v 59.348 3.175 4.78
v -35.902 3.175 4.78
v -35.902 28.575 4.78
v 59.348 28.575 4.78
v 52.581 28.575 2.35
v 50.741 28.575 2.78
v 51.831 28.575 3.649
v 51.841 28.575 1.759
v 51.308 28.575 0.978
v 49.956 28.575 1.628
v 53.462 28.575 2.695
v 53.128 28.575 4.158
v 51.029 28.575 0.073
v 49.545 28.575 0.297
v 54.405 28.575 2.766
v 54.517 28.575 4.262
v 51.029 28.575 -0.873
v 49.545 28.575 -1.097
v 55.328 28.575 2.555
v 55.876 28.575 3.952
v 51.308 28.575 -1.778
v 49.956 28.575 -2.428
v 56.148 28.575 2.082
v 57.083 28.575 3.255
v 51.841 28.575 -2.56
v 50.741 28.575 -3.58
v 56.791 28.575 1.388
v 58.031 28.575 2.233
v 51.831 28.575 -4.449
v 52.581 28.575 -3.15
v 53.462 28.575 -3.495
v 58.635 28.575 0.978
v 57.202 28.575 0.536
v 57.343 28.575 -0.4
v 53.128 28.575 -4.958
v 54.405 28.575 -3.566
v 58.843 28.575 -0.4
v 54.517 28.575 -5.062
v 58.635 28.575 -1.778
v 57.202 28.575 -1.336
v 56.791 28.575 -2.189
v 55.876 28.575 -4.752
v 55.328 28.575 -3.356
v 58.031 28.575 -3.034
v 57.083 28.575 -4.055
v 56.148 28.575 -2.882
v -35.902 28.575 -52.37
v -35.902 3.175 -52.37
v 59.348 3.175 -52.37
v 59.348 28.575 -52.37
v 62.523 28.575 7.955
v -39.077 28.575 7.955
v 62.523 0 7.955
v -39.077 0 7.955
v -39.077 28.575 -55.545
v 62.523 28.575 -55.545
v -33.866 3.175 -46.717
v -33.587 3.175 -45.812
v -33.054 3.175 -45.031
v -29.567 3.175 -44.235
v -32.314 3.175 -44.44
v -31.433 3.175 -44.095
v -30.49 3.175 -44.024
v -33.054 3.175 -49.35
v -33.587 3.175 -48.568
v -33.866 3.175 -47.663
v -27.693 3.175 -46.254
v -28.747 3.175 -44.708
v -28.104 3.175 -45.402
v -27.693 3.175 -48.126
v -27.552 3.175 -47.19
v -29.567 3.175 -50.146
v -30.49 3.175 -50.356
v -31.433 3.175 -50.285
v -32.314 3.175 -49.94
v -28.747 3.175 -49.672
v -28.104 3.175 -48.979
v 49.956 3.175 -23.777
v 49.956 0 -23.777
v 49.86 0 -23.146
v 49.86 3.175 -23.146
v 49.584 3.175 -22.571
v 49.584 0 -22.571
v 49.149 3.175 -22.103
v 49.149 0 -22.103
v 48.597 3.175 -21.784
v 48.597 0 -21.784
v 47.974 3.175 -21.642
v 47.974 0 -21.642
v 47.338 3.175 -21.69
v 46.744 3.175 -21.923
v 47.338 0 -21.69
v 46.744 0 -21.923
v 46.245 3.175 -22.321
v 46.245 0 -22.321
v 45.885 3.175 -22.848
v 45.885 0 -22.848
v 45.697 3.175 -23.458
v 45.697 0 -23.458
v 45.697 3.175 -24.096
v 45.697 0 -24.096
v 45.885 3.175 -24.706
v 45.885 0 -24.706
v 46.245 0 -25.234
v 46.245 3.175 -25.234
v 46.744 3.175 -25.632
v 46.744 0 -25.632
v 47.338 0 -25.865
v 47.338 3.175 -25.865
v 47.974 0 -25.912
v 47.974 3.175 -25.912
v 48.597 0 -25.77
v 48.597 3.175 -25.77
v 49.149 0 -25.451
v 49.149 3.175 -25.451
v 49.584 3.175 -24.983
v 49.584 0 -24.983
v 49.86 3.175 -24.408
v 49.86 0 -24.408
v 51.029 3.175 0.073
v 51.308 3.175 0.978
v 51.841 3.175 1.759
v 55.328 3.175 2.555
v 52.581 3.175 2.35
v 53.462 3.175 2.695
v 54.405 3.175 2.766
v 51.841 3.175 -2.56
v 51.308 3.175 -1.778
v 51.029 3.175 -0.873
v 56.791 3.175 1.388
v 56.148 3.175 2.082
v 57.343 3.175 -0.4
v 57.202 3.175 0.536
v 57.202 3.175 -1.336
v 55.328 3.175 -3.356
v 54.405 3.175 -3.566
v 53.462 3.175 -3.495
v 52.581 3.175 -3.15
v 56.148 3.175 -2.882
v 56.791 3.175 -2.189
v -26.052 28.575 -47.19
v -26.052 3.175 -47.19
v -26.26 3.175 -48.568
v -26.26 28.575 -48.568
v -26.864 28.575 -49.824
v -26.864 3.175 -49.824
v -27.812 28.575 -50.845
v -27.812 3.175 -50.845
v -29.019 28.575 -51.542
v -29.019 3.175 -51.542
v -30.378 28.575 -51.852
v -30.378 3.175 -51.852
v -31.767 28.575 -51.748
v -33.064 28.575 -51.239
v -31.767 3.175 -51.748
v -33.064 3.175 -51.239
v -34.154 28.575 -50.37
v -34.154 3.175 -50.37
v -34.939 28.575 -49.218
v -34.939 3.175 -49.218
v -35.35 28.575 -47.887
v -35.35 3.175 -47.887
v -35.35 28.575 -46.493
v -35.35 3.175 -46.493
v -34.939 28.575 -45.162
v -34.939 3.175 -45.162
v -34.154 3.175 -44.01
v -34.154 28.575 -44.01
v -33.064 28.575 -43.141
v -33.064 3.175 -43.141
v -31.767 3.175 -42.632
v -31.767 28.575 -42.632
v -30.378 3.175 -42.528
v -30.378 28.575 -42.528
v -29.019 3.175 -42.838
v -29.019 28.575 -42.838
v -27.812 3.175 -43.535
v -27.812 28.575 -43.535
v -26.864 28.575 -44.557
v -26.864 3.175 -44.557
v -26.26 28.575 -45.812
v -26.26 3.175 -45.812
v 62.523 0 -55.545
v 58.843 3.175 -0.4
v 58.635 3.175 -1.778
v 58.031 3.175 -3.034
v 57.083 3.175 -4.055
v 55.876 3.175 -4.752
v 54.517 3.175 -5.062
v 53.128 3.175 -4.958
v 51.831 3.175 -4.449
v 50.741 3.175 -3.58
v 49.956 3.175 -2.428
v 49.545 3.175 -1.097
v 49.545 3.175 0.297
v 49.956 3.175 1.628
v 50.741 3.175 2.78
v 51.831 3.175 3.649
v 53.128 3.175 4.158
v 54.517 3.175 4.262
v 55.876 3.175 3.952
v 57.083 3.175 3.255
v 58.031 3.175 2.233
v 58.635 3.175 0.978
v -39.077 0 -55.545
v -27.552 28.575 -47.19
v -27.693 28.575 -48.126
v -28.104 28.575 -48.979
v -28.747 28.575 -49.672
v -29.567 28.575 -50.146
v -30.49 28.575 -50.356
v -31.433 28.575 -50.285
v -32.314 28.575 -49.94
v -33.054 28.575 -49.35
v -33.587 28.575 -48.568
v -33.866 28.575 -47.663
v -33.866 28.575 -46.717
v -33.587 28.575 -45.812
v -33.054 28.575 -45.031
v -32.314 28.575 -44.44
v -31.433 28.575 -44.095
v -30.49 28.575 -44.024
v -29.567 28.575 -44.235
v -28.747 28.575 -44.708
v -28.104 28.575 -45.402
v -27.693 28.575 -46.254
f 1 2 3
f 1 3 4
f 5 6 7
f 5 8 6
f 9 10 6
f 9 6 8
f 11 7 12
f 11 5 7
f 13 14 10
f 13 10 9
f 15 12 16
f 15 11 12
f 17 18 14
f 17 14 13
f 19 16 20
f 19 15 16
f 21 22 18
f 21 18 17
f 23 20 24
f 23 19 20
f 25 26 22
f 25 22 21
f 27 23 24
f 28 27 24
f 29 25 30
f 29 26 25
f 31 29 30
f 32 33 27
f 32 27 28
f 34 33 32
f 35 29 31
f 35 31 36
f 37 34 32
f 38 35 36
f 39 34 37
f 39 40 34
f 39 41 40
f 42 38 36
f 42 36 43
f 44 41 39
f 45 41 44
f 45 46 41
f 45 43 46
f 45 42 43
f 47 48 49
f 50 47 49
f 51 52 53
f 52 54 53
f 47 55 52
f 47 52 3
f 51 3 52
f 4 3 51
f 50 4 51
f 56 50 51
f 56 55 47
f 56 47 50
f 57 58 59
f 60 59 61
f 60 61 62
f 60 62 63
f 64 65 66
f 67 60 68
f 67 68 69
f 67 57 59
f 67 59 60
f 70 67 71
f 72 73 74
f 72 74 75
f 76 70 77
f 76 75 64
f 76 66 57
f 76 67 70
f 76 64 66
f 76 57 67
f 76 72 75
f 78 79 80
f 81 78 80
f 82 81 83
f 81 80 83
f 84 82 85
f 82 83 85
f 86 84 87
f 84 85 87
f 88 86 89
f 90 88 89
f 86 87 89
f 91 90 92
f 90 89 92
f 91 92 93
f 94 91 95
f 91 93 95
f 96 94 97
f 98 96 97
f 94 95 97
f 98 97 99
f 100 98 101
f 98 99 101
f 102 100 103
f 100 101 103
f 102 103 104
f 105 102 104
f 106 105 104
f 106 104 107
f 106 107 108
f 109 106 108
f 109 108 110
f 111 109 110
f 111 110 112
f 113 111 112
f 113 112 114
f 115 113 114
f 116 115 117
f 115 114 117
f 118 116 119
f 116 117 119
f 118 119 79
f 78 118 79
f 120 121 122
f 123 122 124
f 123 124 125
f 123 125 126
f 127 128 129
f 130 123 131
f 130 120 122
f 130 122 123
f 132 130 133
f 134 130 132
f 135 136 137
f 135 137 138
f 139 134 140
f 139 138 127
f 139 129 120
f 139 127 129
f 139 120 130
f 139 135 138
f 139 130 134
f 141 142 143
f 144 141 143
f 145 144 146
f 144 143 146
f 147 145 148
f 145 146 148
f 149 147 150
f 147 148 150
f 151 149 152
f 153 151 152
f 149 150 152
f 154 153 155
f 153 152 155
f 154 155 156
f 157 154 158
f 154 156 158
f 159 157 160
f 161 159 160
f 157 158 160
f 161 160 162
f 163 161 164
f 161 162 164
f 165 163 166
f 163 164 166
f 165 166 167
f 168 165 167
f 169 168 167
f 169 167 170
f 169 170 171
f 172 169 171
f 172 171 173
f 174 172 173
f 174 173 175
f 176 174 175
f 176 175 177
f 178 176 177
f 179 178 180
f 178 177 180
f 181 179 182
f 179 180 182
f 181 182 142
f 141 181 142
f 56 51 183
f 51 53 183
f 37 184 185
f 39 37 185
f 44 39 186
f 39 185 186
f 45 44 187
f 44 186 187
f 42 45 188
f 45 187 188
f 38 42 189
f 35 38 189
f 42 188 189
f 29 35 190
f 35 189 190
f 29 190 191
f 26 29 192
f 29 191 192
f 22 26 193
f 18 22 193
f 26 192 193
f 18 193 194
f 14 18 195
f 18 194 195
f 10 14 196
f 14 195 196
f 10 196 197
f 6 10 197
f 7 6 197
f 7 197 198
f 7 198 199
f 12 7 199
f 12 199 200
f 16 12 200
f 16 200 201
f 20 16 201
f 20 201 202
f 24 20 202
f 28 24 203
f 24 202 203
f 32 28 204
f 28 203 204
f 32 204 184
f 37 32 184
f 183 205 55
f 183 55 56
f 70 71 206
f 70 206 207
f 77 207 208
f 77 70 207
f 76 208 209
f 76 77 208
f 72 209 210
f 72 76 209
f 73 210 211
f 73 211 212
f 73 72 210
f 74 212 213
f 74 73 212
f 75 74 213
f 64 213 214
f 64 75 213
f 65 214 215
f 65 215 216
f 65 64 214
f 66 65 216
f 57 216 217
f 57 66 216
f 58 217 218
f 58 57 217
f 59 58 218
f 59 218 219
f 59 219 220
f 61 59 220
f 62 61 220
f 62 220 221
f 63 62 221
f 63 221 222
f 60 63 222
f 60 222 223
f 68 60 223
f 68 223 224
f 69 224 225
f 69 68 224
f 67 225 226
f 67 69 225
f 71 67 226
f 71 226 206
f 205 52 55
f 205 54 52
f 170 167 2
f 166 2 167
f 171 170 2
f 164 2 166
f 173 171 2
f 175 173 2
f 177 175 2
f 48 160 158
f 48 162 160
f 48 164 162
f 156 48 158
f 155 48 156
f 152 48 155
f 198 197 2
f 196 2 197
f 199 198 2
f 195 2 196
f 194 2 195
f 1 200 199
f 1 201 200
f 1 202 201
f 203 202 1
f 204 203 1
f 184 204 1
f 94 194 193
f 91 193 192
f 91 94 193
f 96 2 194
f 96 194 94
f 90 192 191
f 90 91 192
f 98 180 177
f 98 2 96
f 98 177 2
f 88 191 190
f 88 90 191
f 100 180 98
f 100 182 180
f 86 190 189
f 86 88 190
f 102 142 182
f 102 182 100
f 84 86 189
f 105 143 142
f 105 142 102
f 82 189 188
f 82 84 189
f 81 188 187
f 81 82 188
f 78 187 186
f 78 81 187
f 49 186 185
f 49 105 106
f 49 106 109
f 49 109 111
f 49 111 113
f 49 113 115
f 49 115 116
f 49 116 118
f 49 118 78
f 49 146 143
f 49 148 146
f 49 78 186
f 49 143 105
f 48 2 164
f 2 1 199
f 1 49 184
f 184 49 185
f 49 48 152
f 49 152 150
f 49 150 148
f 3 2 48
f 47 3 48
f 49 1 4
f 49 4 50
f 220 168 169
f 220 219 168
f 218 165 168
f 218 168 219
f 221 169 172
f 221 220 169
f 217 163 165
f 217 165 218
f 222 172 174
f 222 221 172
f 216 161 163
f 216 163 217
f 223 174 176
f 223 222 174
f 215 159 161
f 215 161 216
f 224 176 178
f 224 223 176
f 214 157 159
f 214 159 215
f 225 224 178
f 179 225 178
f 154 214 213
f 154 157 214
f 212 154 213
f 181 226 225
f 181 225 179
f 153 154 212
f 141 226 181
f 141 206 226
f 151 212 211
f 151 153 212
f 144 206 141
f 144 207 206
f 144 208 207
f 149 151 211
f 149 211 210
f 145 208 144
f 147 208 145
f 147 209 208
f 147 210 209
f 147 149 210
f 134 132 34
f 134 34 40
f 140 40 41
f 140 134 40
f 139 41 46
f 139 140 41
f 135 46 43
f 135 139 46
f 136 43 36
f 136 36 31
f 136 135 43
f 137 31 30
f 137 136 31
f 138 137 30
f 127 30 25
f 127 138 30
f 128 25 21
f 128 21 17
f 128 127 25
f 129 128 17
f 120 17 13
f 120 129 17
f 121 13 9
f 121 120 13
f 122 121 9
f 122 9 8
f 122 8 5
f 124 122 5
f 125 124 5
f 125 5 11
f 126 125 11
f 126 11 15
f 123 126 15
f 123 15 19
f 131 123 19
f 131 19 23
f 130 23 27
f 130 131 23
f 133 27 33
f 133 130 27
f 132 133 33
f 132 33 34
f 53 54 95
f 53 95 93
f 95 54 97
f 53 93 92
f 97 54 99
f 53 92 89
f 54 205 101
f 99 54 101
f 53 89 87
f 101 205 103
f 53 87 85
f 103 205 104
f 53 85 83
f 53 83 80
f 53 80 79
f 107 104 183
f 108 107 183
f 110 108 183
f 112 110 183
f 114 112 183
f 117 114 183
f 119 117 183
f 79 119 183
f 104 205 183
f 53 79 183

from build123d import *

# Parameters (mm, degrees)
SKETCH1_W           = 101.6
SKETCH1_H           = 63.5
BOSS_EXTRUDE1_DEPTH = 3.175
SKETCH2_W           = 101.6
SKETCH2_H           = 63.5
SKETCH2_W_2         = 95.25
SKETCH2_H_2         = 57.15
BOSS_EXTRUDE3_DEPTH = 25.4
SKETCH3_R           = 2.141141326
CUT_EXTRUDE1_DEPTH  = 3.175
SKETCH5_R           = 4.675
SKETCH5_R_2         = 3.175
BOSS_EXTRUDE4_DEPTH = 25.4


with BuildPart() as part:
    # Sketch1 → Boss-Extrude1 (new body)
    with BuildSketch(Plane(origin=(0, 0, 0), x_dir=(1, 0, 0), z_dir=(0, 1, 0))):
        with Locations((11.723076923, 23.795054945)):
            Rectangle(SKETCH1_W, SKETCH1_H)
    extrude(amount=BOSS_EXTRUDE1_DEPTH)

    # Sketch2 → Boss-Extrude3 (add)
    with BuildSketch(Plane(origin=(0, 3.175, 0), x_dir=(1, 0, 0), z_dir=(0, 1, 0))):
        with Locations((11.723076923, 23.795054945)):
            Rectangle(SKETCH2_W, SKETCH2_H)
        with Locations((11.723076923, 23.795054945)):
            Rectangle(SKETCH2_W_2, SKETCH2_H_2, mode=Mode.SUBTRACT)
    extrude(amount=BOSS_EXTRUDE3_DEPTH)

    # Sketch3 → Cut-Extrude1 (cut)
    with BuildSketch(Plane.XZ):
        with Locations((47.814406836, -23.777289581)):
            Circle(SKETCH3_R)
    extrude(amount=-CUT_EXTRUDE1_DEPTH, mode=Mode.SUBTRACT)

    # Sketch5 → Boss-Extrude4 (add)
    with BuildSketch(Plane(origin=(0, 3.175, 0), x_dir=(1, 0, 0), z_dir=(0, 1, 0))):
        with Locations((-30.726923077, 47.190054945)):
            Circle(SKETCH5_R)
        with Locations((-30.726923077, 47.190054945)):
            Circle(SKETCH5_R_2, mode=Mode.SUBTRACT)
        with Locations((54.168076923, 0.400054945)):
            Circle(SKETCH5_R)
        with Locations((54.168076923, 0.400054945)):
            Circle(SKETCH5_R_2, mode=Mode.SUBTRACT)
    extrude(amount=BOSS_EXTRUDE4_DEPTH)


solid = part.part
